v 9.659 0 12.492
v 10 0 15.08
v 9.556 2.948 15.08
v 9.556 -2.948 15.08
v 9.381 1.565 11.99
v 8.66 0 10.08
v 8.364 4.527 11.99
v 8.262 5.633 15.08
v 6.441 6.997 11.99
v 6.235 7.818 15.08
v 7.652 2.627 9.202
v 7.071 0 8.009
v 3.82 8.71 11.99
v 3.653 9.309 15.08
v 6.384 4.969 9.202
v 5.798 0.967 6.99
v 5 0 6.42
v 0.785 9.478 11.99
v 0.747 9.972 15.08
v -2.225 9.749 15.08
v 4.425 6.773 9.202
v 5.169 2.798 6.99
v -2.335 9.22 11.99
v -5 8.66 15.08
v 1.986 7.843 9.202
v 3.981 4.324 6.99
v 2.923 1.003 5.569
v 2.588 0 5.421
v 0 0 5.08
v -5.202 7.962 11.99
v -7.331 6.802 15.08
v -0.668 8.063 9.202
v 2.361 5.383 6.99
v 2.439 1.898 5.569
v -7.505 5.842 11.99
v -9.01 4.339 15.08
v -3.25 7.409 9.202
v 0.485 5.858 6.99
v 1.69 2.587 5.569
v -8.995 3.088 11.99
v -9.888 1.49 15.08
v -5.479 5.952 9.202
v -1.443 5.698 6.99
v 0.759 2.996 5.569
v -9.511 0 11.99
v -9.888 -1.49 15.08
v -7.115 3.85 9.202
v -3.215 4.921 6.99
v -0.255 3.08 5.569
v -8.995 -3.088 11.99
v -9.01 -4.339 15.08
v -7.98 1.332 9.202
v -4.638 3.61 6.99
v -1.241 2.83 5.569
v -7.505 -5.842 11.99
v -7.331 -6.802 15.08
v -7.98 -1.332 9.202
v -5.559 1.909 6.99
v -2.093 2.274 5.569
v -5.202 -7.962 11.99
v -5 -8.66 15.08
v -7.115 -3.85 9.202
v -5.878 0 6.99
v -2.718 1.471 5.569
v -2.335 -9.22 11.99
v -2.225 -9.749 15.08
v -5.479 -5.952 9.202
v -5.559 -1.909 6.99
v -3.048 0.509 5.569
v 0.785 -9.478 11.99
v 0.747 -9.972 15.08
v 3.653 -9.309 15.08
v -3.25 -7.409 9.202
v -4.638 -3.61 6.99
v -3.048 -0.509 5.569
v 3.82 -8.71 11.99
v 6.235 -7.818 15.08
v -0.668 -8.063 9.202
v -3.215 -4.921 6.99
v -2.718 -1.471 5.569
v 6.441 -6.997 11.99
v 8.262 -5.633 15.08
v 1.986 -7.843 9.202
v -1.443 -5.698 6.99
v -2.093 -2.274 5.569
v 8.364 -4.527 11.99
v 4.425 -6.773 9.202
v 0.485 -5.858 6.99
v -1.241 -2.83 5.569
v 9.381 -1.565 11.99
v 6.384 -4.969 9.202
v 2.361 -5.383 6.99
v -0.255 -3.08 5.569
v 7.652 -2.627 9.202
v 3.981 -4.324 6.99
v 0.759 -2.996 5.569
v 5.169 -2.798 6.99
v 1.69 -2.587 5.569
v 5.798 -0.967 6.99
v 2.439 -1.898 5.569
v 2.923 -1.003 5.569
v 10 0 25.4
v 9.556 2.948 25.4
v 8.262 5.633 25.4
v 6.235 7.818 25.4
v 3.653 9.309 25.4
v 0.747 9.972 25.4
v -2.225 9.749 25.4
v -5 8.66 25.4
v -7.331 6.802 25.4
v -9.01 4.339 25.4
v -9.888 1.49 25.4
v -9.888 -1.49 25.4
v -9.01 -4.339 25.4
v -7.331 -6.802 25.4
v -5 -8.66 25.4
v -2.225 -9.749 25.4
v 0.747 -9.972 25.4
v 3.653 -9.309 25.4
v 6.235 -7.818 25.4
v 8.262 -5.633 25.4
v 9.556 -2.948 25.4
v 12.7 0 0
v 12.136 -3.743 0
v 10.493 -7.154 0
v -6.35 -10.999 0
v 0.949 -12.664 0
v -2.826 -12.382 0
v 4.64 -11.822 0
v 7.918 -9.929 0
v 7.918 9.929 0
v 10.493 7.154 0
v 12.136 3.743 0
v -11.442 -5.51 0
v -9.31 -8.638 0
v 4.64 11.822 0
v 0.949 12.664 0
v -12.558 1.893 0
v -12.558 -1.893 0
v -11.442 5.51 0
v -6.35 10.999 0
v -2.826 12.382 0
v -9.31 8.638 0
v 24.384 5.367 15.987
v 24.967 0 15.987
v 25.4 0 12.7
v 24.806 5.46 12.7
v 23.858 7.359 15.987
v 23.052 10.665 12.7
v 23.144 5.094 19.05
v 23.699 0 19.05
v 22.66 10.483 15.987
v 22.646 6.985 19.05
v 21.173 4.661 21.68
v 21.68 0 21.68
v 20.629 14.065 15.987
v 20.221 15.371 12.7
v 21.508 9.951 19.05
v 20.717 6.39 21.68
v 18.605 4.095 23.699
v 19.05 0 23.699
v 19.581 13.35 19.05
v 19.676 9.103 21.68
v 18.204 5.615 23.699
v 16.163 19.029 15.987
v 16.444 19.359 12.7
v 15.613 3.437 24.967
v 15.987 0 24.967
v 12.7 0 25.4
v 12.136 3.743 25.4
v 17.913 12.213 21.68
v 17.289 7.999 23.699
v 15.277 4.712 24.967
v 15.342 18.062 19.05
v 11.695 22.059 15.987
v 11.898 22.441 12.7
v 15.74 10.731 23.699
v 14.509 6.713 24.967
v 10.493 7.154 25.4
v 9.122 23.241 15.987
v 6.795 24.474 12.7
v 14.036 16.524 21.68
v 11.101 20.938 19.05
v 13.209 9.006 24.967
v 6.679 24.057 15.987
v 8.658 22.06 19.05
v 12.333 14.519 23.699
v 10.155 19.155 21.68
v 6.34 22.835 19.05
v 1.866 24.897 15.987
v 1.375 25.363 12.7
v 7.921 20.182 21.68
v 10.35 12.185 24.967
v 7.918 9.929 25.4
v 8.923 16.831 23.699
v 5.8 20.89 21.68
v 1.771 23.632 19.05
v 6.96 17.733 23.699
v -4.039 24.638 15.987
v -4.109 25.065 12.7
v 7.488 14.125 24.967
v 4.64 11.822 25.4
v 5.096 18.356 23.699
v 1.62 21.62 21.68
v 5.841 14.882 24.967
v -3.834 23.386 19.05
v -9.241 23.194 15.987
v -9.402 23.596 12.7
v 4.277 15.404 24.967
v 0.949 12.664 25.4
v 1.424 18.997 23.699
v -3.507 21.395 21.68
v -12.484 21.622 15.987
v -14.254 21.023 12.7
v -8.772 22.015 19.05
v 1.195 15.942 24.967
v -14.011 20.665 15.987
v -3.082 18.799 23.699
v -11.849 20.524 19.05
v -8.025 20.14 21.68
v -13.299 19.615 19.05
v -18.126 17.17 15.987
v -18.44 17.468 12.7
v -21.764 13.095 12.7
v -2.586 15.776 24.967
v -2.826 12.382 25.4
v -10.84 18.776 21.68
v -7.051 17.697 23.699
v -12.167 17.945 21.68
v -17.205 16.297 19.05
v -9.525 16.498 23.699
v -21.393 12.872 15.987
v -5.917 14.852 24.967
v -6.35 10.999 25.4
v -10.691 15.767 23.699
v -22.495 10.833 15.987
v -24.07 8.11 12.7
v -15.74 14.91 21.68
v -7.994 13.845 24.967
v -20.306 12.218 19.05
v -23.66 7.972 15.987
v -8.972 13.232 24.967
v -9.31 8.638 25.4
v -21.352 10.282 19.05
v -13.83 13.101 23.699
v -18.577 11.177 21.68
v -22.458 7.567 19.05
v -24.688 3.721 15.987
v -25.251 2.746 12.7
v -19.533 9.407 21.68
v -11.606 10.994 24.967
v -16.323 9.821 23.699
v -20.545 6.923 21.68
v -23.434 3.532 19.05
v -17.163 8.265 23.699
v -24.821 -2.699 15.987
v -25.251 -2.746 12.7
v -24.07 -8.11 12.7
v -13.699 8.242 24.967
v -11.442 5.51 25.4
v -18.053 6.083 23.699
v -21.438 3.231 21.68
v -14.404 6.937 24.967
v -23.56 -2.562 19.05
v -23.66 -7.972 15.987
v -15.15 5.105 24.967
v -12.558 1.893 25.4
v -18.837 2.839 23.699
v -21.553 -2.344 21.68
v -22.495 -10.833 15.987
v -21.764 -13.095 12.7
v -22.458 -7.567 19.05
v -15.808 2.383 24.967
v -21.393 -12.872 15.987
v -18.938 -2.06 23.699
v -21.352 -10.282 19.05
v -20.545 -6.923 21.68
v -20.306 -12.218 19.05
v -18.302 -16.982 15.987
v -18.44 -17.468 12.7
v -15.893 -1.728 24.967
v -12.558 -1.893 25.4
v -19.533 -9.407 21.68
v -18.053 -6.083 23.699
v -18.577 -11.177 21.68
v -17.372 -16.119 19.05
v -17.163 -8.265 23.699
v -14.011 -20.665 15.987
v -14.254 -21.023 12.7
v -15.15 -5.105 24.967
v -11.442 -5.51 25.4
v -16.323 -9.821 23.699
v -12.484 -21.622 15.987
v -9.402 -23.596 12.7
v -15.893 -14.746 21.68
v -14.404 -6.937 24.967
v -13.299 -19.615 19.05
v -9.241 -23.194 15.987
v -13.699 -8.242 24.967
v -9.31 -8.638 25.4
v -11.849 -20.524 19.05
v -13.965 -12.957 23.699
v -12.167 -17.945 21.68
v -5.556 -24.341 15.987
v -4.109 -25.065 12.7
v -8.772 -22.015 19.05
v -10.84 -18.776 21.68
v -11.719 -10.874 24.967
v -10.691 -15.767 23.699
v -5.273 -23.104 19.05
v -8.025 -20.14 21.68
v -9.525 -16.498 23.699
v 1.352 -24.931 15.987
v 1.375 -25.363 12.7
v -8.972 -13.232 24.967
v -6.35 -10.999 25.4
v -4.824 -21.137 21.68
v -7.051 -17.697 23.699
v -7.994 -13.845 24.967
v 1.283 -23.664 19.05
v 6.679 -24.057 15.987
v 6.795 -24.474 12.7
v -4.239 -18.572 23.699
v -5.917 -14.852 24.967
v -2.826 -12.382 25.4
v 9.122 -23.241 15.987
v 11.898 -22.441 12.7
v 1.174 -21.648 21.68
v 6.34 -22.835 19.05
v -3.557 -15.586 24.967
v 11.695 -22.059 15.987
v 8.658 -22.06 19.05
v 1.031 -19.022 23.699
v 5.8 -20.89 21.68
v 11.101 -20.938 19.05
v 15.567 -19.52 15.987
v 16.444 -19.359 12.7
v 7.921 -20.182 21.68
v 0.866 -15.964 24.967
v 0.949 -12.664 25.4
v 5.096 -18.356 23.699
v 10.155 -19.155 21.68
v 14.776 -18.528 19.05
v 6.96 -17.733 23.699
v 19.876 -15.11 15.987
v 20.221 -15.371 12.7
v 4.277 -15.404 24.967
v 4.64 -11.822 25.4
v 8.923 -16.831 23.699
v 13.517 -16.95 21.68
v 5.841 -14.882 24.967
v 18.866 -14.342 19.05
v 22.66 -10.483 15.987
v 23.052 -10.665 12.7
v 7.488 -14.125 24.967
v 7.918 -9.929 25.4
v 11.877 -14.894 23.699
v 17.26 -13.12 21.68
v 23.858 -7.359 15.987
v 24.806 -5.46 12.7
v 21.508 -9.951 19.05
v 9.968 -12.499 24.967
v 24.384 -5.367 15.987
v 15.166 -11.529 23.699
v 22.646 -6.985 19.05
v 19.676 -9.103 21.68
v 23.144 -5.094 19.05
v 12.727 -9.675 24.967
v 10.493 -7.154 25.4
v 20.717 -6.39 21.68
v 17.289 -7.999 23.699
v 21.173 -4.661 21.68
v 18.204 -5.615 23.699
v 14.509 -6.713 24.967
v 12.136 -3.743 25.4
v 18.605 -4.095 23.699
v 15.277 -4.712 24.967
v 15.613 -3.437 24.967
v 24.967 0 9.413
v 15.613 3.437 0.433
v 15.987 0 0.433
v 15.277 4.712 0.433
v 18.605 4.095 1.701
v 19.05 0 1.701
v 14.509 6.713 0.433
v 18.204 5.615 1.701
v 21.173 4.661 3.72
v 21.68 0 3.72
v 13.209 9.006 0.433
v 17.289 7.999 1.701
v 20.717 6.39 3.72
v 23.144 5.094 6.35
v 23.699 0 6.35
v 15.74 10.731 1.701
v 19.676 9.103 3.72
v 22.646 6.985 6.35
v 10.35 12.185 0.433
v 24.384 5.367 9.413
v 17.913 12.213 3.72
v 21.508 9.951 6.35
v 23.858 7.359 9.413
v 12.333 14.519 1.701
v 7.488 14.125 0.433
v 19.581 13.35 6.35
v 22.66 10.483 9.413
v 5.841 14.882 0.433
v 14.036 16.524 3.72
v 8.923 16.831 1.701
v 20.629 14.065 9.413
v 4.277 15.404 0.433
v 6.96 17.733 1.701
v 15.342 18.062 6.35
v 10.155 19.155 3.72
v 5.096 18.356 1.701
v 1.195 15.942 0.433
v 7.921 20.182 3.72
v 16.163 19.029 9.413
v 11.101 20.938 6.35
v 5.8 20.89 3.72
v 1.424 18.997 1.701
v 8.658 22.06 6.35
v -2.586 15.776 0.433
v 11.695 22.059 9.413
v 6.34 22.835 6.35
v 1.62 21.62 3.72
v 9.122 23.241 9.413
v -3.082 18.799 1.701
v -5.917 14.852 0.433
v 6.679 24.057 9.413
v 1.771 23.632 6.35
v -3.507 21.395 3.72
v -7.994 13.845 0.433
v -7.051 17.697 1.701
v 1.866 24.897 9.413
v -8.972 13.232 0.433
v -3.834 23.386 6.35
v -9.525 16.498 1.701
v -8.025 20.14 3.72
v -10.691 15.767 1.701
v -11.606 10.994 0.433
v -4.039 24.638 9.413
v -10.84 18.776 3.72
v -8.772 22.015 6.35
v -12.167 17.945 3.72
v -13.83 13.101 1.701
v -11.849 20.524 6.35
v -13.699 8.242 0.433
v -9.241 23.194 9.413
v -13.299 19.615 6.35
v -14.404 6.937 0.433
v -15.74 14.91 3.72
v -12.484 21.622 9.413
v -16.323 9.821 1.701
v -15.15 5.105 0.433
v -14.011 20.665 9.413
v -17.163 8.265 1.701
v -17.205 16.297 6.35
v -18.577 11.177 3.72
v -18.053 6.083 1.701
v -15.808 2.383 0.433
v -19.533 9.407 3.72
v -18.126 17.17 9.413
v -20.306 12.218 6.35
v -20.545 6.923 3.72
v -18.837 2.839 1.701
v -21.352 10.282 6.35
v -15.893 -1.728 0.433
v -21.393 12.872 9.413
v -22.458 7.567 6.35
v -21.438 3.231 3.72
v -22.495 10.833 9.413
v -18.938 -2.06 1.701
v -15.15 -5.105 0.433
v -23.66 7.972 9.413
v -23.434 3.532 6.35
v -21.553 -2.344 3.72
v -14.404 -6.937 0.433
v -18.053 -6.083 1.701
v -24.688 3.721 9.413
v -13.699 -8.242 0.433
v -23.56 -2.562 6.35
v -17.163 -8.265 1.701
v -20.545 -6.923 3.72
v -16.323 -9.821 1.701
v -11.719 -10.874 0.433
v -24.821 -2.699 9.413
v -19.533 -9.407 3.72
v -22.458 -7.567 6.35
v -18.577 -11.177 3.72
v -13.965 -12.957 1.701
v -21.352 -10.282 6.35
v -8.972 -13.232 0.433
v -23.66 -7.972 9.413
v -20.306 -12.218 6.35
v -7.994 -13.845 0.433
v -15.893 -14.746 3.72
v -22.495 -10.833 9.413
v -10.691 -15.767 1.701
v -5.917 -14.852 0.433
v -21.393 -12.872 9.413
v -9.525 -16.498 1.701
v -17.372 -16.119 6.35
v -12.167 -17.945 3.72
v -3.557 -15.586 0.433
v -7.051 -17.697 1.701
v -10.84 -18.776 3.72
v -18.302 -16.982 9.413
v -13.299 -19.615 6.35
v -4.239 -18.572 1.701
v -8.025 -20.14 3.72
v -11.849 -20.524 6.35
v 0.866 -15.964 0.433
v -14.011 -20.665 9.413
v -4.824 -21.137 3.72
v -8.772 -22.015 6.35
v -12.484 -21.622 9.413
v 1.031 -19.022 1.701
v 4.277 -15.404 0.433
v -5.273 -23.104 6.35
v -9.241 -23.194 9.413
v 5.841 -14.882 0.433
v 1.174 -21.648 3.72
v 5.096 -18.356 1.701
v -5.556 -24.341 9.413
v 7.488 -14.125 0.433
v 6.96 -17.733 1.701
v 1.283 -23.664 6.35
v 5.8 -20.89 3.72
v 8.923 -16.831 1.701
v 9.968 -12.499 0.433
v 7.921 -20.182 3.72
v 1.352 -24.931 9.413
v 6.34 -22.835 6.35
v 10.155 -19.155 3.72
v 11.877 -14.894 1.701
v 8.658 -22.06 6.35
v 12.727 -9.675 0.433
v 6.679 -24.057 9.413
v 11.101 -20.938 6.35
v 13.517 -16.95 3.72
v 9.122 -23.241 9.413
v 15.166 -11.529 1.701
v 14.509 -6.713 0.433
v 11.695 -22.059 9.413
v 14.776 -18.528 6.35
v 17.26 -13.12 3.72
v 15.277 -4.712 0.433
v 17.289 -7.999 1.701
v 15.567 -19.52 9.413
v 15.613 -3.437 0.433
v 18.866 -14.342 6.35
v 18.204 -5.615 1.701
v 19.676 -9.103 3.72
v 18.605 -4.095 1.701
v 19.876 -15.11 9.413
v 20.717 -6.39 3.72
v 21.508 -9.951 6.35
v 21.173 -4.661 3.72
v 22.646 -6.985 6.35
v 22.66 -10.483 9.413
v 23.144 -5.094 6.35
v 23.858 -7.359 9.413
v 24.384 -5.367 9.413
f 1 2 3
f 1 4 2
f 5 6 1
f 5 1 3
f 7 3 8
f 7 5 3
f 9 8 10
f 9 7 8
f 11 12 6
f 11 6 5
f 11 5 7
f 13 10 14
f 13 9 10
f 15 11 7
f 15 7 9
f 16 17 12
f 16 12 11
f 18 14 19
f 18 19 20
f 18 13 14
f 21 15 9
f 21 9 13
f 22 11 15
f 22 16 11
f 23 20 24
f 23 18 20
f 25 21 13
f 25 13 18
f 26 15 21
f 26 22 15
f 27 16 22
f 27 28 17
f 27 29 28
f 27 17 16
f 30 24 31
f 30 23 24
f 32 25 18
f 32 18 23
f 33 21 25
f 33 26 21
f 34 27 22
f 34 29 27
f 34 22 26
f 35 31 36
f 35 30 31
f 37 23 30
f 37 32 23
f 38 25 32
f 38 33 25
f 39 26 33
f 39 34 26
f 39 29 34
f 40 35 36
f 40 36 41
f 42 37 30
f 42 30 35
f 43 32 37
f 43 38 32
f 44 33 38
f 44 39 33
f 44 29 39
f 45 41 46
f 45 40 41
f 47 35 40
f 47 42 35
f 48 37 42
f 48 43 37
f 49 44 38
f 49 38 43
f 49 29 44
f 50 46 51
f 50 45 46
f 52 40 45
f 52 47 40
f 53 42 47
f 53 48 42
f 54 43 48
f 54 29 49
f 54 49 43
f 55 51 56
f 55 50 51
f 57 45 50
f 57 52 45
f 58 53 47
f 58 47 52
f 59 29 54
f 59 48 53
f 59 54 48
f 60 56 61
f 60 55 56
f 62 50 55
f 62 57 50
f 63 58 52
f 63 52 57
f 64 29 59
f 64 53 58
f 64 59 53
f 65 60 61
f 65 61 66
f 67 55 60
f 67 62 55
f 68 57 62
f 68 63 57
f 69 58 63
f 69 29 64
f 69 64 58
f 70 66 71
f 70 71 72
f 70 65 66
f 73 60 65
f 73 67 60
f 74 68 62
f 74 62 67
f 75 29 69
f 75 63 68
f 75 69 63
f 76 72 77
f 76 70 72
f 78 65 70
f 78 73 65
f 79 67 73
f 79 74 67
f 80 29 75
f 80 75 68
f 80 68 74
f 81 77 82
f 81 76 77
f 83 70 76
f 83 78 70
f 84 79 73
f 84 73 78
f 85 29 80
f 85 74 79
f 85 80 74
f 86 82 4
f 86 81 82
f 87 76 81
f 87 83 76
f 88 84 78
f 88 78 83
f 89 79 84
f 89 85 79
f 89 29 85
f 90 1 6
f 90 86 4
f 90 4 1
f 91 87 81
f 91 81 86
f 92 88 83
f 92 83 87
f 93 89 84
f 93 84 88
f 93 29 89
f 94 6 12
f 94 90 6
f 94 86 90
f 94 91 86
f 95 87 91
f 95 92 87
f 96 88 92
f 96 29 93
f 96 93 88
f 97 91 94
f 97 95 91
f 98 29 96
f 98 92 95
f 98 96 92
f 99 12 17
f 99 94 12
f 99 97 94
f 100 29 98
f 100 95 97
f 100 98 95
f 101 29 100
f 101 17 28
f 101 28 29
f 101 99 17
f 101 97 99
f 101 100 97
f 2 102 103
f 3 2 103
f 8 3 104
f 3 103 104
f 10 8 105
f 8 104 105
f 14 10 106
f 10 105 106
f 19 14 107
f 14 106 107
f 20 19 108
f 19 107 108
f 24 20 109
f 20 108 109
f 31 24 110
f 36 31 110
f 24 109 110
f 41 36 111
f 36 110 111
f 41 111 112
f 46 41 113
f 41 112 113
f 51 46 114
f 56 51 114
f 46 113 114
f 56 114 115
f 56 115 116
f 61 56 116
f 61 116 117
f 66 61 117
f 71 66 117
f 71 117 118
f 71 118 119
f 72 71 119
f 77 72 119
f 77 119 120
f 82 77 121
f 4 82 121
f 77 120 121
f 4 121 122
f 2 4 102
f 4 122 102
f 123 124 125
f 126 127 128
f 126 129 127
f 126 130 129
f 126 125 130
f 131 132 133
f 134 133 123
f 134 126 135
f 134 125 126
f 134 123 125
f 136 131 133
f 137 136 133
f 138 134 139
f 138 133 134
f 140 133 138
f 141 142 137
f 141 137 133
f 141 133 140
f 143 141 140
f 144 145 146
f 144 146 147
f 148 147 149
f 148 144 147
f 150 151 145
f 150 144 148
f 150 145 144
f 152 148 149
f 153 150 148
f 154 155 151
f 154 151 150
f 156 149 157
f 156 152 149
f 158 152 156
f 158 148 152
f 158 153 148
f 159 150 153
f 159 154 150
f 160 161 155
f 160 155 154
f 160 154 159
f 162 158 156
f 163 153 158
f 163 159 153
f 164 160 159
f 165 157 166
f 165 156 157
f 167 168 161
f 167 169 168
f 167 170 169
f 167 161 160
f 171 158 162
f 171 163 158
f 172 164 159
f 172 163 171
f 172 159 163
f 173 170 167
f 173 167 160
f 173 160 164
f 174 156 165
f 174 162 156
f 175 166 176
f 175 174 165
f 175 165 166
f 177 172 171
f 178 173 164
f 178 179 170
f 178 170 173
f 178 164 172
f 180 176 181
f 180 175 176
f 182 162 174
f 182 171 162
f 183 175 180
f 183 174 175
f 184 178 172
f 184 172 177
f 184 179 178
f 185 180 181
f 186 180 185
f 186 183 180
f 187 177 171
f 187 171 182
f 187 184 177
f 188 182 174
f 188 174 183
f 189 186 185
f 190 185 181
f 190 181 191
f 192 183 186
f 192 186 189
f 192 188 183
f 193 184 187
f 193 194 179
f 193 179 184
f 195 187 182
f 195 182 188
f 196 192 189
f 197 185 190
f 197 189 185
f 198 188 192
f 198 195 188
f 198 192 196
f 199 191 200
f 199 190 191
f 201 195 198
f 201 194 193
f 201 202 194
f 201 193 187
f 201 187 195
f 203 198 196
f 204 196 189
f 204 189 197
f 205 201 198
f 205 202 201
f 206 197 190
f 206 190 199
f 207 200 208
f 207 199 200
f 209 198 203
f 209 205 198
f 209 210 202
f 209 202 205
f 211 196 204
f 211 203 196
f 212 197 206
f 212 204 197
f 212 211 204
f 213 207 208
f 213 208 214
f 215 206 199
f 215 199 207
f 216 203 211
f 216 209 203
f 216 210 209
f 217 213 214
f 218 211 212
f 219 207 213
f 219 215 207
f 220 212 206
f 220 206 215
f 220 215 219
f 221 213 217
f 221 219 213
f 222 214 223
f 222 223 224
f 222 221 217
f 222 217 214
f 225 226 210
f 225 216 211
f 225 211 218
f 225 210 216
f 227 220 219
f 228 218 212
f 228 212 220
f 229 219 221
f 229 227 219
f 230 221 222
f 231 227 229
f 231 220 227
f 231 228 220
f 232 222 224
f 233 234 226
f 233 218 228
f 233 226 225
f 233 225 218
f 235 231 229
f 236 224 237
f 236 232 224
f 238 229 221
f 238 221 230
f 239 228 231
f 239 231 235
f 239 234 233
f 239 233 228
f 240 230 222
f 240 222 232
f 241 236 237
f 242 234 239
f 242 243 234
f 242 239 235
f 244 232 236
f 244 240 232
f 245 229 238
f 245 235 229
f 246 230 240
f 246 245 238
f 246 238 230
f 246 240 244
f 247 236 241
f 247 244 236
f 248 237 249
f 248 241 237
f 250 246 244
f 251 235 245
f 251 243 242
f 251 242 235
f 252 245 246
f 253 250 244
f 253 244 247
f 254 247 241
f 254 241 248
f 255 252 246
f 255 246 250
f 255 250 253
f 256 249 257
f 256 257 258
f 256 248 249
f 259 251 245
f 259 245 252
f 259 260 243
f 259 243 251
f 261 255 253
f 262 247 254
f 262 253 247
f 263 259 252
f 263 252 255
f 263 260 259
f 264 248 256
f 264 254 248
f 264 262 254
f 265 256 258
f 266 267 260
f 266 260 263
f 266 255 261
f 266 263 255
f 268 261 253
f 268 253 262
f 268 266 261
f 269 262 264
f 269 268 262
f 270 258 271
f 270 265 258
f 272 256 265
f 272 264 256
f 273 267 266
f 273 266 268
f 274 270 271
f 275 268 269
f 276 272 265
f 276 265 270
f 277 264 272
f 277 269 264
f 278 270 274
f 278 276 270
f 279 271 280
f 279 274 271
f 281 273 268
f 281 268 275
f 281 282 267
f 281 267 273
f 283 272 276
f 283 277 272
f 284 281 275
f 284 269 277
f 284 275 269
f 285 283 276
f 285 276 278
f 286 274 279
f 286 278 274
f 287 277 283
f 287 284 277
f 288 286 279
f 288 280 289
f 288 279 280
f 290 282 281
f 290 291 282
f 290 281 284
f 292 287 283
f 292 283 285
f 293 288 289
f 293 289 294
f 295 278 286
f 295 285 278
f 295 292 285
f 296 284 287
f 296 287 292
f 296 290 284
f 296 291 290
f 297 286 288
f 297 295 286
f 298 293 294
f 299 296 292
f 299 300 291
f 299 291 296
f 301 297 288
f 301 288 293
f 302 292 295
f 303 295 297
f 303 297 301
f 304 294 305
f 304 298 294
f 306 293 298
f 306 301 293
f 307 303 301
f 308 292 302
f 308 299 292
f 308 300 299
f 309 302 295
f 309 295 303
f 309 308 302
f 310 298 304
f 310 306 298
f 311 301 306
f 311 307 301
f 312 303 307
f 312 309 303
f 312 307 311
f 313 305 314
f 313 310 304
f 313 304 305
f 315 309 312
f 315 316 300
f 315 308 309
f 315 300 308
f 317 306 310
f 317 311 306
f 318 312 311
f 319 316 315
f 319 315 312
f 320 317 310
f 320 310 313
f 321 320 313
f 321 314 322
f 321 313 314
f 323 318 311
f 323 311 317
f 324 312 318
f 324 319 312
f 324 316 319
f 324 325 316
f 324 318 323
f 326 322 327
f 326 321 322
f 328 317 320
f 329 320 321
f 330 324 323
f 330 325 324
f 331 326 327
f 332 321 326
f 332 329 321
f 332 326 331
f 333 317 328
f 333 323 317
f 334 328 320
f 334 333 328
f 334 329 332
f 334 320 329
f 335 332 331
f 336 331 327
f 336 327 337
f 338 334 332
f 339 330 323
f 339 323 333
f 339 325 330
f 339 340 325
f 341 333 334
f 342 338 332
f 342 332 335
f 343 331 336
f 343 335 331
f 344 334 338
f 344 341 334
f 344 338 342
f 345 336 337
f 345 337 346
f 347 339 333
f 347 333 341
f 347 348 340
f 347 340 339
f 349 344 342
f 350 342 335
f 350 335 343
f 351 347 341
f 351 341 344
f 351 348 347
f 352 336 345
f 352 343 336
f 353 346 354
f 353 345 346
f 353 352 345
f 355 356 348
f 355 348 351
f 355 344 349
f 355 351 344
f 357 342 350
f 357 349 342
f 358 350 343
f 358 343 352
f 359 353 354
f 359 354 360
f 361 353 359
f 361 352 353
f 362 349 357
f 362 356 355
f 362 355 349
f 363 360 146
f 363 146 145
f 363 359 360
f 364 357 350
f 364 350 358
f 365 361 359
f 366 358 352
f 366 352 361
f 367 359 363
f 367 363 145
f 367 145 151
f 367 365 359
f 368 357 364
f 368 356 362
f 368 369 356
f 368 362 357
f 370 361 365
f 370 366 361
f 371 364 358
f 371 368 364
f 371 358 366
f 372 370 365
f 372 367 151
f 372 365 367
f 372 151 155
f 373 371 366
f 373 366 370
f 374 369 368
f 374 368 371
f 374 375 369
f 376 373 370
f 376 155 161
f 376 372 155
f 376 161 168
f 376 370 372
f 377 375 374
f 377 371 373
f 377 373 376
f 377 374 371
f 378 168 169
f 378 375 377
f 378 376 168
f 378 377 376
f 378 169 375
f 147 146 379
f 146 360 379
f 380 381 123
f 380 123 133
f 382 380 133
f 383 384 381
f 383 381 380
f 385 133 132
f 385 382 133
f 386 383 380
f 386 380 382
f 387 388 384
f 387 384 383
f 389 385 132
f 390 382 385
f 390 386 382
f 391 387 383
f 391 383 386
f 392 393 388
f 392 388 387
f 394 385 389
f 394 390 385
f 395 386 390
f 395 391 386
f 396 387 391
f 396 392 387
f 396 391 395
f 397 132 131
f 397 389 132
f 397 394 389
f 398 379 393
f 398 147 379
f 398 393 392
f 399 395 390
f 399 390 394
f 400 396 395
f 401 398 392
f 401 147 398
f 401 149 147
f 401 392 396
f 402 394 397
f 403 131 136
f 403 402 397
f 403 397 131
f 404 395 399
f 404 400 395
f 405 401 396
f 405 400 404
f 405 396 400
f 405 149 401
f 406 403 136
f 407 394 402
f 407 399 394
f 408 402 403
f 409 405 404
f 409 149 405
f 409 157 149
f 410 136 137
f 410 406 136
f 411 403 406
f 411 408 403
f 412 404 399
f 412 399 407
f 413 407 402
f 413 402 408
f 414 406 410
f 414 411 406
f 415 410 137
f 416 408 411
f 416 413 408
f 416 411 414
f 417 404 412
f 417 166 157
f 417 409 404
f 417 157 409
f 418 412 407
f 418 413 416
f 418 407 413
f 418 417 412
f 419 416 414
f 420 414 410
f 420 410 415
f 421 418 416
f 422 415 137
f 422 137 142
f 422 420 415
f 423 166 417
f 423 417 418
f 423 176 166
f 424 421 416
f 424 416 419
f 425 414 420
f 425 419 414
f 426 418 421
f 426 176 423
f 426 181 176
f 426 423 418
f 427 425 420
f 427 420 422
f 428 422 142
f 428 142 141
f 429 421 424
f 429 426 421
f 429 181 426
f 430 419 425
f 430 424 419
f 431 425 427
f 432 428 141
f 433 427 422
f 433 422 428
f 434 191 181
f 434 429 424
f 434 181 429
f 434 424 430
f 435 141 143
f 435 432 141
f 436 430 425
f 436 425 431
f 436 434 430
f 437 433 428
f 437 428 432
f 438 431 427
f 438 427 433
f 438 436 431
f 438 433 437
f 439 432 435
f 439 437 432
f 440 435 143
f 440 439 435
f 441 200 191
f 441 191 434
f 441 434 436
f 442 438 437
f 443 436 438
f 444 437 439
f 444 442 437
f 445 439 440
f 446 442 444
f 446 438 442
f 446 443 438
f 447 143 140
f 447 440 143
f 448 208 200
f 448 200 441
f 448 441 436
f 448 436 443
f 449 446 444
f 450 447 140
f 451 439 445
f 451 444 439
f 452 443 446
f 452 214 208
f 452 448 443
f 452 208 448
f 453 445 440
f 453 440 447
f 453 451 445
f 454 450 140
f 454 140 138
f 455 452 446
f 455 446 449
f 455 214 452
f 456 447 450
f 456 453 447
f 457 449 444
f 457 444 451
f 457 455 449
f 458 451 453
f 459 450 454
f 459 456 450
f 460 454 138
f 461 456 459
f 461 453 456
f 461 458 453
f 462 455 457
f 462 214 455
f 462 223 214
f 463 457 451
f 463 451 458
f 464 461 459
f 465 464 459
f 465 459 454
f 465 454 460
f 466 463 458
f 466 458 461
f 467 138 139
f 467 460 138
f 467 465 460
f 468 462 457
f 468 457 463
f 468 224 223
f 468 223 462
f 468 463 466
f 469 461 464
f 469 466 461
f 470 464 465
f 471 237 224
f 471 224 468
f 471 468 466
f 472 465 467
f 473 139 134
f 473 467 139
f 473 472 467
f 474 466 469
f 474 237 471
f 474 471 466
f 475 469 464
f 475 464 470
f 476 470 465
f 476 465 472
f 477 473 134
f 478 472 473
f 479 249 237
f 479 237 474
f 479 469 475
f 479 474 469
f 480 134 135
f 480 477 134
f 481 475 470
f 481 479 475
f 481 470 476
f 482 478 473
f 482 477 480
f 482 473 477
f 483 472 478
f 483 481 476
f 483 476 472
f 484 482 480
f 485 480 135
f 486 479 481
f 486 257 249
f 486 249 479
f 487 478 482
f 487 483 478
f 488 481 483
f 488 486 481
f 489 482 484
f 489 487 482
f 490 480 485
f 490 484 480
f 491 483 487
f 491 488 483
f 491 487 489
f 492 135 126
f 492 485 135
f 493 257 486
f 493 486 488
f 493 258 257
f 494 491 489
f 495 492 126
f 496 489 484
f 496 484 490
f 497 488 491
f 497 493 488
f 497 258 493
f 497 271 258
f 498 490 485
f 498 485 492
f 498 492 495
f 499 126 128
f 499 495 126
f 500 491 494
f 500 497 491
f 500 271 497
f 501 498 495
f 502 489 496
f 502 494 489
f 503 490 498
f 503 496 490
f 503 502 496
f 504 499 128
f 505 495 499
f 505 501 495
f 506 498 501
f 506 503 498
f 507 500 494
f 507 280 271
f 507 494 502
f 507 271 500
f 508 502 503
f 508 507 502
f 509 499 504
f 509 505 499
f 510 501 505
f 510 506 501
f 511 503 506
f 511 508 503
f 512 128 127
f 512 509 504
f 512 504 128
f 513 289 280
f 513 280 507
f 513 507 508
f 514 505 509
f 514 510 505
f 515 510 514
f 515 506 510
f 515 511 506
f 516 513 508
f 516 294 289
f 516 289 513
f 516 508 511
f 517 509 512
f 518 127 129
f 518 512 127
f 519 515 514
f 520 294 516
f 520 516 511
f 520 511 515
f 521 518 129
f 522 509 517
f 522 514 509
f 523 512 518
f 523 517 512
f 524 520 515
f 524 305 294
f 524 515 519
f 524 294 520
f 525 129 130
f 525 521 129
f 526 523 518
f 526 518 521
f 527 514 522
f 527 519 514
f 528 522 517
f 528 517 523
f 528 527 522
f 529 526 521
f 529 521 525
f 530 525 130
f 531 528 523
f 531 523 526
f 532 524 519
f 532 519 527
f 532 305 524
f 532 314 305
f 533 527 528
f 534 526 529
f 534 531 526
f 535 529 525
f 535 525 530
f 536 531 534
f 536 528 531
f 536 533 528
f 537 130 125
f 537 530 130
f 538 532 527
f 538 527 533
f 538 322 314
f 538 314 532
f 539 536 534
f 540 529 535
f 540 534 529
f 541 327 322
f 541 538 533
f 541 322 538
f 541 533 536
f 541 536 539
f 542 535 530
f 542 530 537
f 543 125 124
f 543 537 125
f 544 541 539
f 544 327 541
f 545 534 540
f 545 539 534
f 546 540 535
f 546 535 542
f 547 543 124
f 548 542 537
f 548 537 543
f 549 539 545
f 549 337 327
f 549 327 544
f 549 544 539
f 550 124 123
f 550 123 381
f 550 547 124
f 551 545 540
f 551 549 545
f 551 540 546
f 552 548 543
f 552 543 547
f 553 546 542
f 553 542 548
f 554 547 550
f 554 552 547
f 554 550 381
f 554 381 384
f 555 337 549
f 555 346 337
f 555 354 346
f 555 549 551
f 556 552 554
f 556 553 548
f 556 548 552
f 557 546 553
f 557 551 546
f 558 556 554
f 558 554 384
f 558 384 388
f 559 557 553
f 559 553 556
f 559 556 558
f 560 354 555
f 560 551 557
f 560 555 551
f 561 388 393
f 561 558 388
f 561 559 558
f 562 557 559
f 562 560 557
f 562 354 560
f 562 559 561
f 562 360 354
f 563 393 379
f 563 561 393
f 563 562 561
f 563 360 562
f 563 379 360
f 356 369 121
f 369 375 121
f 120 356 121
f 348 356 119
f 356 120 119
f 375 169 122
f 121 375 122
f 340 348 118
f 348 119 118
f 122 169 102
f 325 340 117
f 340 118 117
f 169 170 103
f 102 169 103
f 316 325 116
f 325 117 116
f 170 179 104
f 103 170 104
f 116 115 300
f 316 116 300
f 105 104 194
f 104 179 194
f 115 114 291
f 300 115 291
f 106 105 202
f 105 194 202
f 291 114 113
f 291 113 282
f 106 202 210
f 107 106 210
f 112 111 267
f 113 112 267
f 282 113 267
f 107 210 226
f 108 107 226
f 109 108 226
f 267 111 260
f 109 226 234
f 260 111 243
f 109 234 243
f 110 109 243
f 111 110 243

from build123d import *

# Parameters (mm, degrees)
F0_W     = 25.4
F0_H     = 25.4
F2_R     = 12.69999
F3_R     = 10
F4_DEPTH = 20.32
F5_R     = 10


# Not quite as in the source:
# - a fillet or chamfer is up to 0.001 mm smaller than in the source, because OpenCascade refuses the exact size


with BuildPart() as f1:
    # F0 (on Front) → F1 (revolve)
    with BuildSketch(Plane.XZ):
        with Locations((12.7, 12.7)):
            Rectangle(F0_W, F0_H)
    revolve(axis=Axis((0, 0, 17.3243917525), (0, 0, 1)))

    # F2 (radius 12.7 in the source; OpenCascade refuses exactly that, so slightly less here)
    f2_edges = [f1.edges().sort_by_distance(p)[0] for p in [
        (-25.4, 0, 0),
        (-25.4, 0, 25.4),
        (25.4, 0, 12.7),
    ]]
    fillet(f2_edges, radius=F2_R)

    # F3 (on face) → F4 (cut)
    with BuildSketch(Plane.XY.offset(25.4)):
        Circle(F3_R)
    extrude(amount=-F4_DEPTH, mode=Mode.SUBTRACT)

    # F5
    f5_edges = [f1.edges().sort_by_distance(p)[0] for p in [
        (-10, 0, 5.08),
    ]]
    fillet(f5_edges, radius=F5_R)


solid = f1.part
